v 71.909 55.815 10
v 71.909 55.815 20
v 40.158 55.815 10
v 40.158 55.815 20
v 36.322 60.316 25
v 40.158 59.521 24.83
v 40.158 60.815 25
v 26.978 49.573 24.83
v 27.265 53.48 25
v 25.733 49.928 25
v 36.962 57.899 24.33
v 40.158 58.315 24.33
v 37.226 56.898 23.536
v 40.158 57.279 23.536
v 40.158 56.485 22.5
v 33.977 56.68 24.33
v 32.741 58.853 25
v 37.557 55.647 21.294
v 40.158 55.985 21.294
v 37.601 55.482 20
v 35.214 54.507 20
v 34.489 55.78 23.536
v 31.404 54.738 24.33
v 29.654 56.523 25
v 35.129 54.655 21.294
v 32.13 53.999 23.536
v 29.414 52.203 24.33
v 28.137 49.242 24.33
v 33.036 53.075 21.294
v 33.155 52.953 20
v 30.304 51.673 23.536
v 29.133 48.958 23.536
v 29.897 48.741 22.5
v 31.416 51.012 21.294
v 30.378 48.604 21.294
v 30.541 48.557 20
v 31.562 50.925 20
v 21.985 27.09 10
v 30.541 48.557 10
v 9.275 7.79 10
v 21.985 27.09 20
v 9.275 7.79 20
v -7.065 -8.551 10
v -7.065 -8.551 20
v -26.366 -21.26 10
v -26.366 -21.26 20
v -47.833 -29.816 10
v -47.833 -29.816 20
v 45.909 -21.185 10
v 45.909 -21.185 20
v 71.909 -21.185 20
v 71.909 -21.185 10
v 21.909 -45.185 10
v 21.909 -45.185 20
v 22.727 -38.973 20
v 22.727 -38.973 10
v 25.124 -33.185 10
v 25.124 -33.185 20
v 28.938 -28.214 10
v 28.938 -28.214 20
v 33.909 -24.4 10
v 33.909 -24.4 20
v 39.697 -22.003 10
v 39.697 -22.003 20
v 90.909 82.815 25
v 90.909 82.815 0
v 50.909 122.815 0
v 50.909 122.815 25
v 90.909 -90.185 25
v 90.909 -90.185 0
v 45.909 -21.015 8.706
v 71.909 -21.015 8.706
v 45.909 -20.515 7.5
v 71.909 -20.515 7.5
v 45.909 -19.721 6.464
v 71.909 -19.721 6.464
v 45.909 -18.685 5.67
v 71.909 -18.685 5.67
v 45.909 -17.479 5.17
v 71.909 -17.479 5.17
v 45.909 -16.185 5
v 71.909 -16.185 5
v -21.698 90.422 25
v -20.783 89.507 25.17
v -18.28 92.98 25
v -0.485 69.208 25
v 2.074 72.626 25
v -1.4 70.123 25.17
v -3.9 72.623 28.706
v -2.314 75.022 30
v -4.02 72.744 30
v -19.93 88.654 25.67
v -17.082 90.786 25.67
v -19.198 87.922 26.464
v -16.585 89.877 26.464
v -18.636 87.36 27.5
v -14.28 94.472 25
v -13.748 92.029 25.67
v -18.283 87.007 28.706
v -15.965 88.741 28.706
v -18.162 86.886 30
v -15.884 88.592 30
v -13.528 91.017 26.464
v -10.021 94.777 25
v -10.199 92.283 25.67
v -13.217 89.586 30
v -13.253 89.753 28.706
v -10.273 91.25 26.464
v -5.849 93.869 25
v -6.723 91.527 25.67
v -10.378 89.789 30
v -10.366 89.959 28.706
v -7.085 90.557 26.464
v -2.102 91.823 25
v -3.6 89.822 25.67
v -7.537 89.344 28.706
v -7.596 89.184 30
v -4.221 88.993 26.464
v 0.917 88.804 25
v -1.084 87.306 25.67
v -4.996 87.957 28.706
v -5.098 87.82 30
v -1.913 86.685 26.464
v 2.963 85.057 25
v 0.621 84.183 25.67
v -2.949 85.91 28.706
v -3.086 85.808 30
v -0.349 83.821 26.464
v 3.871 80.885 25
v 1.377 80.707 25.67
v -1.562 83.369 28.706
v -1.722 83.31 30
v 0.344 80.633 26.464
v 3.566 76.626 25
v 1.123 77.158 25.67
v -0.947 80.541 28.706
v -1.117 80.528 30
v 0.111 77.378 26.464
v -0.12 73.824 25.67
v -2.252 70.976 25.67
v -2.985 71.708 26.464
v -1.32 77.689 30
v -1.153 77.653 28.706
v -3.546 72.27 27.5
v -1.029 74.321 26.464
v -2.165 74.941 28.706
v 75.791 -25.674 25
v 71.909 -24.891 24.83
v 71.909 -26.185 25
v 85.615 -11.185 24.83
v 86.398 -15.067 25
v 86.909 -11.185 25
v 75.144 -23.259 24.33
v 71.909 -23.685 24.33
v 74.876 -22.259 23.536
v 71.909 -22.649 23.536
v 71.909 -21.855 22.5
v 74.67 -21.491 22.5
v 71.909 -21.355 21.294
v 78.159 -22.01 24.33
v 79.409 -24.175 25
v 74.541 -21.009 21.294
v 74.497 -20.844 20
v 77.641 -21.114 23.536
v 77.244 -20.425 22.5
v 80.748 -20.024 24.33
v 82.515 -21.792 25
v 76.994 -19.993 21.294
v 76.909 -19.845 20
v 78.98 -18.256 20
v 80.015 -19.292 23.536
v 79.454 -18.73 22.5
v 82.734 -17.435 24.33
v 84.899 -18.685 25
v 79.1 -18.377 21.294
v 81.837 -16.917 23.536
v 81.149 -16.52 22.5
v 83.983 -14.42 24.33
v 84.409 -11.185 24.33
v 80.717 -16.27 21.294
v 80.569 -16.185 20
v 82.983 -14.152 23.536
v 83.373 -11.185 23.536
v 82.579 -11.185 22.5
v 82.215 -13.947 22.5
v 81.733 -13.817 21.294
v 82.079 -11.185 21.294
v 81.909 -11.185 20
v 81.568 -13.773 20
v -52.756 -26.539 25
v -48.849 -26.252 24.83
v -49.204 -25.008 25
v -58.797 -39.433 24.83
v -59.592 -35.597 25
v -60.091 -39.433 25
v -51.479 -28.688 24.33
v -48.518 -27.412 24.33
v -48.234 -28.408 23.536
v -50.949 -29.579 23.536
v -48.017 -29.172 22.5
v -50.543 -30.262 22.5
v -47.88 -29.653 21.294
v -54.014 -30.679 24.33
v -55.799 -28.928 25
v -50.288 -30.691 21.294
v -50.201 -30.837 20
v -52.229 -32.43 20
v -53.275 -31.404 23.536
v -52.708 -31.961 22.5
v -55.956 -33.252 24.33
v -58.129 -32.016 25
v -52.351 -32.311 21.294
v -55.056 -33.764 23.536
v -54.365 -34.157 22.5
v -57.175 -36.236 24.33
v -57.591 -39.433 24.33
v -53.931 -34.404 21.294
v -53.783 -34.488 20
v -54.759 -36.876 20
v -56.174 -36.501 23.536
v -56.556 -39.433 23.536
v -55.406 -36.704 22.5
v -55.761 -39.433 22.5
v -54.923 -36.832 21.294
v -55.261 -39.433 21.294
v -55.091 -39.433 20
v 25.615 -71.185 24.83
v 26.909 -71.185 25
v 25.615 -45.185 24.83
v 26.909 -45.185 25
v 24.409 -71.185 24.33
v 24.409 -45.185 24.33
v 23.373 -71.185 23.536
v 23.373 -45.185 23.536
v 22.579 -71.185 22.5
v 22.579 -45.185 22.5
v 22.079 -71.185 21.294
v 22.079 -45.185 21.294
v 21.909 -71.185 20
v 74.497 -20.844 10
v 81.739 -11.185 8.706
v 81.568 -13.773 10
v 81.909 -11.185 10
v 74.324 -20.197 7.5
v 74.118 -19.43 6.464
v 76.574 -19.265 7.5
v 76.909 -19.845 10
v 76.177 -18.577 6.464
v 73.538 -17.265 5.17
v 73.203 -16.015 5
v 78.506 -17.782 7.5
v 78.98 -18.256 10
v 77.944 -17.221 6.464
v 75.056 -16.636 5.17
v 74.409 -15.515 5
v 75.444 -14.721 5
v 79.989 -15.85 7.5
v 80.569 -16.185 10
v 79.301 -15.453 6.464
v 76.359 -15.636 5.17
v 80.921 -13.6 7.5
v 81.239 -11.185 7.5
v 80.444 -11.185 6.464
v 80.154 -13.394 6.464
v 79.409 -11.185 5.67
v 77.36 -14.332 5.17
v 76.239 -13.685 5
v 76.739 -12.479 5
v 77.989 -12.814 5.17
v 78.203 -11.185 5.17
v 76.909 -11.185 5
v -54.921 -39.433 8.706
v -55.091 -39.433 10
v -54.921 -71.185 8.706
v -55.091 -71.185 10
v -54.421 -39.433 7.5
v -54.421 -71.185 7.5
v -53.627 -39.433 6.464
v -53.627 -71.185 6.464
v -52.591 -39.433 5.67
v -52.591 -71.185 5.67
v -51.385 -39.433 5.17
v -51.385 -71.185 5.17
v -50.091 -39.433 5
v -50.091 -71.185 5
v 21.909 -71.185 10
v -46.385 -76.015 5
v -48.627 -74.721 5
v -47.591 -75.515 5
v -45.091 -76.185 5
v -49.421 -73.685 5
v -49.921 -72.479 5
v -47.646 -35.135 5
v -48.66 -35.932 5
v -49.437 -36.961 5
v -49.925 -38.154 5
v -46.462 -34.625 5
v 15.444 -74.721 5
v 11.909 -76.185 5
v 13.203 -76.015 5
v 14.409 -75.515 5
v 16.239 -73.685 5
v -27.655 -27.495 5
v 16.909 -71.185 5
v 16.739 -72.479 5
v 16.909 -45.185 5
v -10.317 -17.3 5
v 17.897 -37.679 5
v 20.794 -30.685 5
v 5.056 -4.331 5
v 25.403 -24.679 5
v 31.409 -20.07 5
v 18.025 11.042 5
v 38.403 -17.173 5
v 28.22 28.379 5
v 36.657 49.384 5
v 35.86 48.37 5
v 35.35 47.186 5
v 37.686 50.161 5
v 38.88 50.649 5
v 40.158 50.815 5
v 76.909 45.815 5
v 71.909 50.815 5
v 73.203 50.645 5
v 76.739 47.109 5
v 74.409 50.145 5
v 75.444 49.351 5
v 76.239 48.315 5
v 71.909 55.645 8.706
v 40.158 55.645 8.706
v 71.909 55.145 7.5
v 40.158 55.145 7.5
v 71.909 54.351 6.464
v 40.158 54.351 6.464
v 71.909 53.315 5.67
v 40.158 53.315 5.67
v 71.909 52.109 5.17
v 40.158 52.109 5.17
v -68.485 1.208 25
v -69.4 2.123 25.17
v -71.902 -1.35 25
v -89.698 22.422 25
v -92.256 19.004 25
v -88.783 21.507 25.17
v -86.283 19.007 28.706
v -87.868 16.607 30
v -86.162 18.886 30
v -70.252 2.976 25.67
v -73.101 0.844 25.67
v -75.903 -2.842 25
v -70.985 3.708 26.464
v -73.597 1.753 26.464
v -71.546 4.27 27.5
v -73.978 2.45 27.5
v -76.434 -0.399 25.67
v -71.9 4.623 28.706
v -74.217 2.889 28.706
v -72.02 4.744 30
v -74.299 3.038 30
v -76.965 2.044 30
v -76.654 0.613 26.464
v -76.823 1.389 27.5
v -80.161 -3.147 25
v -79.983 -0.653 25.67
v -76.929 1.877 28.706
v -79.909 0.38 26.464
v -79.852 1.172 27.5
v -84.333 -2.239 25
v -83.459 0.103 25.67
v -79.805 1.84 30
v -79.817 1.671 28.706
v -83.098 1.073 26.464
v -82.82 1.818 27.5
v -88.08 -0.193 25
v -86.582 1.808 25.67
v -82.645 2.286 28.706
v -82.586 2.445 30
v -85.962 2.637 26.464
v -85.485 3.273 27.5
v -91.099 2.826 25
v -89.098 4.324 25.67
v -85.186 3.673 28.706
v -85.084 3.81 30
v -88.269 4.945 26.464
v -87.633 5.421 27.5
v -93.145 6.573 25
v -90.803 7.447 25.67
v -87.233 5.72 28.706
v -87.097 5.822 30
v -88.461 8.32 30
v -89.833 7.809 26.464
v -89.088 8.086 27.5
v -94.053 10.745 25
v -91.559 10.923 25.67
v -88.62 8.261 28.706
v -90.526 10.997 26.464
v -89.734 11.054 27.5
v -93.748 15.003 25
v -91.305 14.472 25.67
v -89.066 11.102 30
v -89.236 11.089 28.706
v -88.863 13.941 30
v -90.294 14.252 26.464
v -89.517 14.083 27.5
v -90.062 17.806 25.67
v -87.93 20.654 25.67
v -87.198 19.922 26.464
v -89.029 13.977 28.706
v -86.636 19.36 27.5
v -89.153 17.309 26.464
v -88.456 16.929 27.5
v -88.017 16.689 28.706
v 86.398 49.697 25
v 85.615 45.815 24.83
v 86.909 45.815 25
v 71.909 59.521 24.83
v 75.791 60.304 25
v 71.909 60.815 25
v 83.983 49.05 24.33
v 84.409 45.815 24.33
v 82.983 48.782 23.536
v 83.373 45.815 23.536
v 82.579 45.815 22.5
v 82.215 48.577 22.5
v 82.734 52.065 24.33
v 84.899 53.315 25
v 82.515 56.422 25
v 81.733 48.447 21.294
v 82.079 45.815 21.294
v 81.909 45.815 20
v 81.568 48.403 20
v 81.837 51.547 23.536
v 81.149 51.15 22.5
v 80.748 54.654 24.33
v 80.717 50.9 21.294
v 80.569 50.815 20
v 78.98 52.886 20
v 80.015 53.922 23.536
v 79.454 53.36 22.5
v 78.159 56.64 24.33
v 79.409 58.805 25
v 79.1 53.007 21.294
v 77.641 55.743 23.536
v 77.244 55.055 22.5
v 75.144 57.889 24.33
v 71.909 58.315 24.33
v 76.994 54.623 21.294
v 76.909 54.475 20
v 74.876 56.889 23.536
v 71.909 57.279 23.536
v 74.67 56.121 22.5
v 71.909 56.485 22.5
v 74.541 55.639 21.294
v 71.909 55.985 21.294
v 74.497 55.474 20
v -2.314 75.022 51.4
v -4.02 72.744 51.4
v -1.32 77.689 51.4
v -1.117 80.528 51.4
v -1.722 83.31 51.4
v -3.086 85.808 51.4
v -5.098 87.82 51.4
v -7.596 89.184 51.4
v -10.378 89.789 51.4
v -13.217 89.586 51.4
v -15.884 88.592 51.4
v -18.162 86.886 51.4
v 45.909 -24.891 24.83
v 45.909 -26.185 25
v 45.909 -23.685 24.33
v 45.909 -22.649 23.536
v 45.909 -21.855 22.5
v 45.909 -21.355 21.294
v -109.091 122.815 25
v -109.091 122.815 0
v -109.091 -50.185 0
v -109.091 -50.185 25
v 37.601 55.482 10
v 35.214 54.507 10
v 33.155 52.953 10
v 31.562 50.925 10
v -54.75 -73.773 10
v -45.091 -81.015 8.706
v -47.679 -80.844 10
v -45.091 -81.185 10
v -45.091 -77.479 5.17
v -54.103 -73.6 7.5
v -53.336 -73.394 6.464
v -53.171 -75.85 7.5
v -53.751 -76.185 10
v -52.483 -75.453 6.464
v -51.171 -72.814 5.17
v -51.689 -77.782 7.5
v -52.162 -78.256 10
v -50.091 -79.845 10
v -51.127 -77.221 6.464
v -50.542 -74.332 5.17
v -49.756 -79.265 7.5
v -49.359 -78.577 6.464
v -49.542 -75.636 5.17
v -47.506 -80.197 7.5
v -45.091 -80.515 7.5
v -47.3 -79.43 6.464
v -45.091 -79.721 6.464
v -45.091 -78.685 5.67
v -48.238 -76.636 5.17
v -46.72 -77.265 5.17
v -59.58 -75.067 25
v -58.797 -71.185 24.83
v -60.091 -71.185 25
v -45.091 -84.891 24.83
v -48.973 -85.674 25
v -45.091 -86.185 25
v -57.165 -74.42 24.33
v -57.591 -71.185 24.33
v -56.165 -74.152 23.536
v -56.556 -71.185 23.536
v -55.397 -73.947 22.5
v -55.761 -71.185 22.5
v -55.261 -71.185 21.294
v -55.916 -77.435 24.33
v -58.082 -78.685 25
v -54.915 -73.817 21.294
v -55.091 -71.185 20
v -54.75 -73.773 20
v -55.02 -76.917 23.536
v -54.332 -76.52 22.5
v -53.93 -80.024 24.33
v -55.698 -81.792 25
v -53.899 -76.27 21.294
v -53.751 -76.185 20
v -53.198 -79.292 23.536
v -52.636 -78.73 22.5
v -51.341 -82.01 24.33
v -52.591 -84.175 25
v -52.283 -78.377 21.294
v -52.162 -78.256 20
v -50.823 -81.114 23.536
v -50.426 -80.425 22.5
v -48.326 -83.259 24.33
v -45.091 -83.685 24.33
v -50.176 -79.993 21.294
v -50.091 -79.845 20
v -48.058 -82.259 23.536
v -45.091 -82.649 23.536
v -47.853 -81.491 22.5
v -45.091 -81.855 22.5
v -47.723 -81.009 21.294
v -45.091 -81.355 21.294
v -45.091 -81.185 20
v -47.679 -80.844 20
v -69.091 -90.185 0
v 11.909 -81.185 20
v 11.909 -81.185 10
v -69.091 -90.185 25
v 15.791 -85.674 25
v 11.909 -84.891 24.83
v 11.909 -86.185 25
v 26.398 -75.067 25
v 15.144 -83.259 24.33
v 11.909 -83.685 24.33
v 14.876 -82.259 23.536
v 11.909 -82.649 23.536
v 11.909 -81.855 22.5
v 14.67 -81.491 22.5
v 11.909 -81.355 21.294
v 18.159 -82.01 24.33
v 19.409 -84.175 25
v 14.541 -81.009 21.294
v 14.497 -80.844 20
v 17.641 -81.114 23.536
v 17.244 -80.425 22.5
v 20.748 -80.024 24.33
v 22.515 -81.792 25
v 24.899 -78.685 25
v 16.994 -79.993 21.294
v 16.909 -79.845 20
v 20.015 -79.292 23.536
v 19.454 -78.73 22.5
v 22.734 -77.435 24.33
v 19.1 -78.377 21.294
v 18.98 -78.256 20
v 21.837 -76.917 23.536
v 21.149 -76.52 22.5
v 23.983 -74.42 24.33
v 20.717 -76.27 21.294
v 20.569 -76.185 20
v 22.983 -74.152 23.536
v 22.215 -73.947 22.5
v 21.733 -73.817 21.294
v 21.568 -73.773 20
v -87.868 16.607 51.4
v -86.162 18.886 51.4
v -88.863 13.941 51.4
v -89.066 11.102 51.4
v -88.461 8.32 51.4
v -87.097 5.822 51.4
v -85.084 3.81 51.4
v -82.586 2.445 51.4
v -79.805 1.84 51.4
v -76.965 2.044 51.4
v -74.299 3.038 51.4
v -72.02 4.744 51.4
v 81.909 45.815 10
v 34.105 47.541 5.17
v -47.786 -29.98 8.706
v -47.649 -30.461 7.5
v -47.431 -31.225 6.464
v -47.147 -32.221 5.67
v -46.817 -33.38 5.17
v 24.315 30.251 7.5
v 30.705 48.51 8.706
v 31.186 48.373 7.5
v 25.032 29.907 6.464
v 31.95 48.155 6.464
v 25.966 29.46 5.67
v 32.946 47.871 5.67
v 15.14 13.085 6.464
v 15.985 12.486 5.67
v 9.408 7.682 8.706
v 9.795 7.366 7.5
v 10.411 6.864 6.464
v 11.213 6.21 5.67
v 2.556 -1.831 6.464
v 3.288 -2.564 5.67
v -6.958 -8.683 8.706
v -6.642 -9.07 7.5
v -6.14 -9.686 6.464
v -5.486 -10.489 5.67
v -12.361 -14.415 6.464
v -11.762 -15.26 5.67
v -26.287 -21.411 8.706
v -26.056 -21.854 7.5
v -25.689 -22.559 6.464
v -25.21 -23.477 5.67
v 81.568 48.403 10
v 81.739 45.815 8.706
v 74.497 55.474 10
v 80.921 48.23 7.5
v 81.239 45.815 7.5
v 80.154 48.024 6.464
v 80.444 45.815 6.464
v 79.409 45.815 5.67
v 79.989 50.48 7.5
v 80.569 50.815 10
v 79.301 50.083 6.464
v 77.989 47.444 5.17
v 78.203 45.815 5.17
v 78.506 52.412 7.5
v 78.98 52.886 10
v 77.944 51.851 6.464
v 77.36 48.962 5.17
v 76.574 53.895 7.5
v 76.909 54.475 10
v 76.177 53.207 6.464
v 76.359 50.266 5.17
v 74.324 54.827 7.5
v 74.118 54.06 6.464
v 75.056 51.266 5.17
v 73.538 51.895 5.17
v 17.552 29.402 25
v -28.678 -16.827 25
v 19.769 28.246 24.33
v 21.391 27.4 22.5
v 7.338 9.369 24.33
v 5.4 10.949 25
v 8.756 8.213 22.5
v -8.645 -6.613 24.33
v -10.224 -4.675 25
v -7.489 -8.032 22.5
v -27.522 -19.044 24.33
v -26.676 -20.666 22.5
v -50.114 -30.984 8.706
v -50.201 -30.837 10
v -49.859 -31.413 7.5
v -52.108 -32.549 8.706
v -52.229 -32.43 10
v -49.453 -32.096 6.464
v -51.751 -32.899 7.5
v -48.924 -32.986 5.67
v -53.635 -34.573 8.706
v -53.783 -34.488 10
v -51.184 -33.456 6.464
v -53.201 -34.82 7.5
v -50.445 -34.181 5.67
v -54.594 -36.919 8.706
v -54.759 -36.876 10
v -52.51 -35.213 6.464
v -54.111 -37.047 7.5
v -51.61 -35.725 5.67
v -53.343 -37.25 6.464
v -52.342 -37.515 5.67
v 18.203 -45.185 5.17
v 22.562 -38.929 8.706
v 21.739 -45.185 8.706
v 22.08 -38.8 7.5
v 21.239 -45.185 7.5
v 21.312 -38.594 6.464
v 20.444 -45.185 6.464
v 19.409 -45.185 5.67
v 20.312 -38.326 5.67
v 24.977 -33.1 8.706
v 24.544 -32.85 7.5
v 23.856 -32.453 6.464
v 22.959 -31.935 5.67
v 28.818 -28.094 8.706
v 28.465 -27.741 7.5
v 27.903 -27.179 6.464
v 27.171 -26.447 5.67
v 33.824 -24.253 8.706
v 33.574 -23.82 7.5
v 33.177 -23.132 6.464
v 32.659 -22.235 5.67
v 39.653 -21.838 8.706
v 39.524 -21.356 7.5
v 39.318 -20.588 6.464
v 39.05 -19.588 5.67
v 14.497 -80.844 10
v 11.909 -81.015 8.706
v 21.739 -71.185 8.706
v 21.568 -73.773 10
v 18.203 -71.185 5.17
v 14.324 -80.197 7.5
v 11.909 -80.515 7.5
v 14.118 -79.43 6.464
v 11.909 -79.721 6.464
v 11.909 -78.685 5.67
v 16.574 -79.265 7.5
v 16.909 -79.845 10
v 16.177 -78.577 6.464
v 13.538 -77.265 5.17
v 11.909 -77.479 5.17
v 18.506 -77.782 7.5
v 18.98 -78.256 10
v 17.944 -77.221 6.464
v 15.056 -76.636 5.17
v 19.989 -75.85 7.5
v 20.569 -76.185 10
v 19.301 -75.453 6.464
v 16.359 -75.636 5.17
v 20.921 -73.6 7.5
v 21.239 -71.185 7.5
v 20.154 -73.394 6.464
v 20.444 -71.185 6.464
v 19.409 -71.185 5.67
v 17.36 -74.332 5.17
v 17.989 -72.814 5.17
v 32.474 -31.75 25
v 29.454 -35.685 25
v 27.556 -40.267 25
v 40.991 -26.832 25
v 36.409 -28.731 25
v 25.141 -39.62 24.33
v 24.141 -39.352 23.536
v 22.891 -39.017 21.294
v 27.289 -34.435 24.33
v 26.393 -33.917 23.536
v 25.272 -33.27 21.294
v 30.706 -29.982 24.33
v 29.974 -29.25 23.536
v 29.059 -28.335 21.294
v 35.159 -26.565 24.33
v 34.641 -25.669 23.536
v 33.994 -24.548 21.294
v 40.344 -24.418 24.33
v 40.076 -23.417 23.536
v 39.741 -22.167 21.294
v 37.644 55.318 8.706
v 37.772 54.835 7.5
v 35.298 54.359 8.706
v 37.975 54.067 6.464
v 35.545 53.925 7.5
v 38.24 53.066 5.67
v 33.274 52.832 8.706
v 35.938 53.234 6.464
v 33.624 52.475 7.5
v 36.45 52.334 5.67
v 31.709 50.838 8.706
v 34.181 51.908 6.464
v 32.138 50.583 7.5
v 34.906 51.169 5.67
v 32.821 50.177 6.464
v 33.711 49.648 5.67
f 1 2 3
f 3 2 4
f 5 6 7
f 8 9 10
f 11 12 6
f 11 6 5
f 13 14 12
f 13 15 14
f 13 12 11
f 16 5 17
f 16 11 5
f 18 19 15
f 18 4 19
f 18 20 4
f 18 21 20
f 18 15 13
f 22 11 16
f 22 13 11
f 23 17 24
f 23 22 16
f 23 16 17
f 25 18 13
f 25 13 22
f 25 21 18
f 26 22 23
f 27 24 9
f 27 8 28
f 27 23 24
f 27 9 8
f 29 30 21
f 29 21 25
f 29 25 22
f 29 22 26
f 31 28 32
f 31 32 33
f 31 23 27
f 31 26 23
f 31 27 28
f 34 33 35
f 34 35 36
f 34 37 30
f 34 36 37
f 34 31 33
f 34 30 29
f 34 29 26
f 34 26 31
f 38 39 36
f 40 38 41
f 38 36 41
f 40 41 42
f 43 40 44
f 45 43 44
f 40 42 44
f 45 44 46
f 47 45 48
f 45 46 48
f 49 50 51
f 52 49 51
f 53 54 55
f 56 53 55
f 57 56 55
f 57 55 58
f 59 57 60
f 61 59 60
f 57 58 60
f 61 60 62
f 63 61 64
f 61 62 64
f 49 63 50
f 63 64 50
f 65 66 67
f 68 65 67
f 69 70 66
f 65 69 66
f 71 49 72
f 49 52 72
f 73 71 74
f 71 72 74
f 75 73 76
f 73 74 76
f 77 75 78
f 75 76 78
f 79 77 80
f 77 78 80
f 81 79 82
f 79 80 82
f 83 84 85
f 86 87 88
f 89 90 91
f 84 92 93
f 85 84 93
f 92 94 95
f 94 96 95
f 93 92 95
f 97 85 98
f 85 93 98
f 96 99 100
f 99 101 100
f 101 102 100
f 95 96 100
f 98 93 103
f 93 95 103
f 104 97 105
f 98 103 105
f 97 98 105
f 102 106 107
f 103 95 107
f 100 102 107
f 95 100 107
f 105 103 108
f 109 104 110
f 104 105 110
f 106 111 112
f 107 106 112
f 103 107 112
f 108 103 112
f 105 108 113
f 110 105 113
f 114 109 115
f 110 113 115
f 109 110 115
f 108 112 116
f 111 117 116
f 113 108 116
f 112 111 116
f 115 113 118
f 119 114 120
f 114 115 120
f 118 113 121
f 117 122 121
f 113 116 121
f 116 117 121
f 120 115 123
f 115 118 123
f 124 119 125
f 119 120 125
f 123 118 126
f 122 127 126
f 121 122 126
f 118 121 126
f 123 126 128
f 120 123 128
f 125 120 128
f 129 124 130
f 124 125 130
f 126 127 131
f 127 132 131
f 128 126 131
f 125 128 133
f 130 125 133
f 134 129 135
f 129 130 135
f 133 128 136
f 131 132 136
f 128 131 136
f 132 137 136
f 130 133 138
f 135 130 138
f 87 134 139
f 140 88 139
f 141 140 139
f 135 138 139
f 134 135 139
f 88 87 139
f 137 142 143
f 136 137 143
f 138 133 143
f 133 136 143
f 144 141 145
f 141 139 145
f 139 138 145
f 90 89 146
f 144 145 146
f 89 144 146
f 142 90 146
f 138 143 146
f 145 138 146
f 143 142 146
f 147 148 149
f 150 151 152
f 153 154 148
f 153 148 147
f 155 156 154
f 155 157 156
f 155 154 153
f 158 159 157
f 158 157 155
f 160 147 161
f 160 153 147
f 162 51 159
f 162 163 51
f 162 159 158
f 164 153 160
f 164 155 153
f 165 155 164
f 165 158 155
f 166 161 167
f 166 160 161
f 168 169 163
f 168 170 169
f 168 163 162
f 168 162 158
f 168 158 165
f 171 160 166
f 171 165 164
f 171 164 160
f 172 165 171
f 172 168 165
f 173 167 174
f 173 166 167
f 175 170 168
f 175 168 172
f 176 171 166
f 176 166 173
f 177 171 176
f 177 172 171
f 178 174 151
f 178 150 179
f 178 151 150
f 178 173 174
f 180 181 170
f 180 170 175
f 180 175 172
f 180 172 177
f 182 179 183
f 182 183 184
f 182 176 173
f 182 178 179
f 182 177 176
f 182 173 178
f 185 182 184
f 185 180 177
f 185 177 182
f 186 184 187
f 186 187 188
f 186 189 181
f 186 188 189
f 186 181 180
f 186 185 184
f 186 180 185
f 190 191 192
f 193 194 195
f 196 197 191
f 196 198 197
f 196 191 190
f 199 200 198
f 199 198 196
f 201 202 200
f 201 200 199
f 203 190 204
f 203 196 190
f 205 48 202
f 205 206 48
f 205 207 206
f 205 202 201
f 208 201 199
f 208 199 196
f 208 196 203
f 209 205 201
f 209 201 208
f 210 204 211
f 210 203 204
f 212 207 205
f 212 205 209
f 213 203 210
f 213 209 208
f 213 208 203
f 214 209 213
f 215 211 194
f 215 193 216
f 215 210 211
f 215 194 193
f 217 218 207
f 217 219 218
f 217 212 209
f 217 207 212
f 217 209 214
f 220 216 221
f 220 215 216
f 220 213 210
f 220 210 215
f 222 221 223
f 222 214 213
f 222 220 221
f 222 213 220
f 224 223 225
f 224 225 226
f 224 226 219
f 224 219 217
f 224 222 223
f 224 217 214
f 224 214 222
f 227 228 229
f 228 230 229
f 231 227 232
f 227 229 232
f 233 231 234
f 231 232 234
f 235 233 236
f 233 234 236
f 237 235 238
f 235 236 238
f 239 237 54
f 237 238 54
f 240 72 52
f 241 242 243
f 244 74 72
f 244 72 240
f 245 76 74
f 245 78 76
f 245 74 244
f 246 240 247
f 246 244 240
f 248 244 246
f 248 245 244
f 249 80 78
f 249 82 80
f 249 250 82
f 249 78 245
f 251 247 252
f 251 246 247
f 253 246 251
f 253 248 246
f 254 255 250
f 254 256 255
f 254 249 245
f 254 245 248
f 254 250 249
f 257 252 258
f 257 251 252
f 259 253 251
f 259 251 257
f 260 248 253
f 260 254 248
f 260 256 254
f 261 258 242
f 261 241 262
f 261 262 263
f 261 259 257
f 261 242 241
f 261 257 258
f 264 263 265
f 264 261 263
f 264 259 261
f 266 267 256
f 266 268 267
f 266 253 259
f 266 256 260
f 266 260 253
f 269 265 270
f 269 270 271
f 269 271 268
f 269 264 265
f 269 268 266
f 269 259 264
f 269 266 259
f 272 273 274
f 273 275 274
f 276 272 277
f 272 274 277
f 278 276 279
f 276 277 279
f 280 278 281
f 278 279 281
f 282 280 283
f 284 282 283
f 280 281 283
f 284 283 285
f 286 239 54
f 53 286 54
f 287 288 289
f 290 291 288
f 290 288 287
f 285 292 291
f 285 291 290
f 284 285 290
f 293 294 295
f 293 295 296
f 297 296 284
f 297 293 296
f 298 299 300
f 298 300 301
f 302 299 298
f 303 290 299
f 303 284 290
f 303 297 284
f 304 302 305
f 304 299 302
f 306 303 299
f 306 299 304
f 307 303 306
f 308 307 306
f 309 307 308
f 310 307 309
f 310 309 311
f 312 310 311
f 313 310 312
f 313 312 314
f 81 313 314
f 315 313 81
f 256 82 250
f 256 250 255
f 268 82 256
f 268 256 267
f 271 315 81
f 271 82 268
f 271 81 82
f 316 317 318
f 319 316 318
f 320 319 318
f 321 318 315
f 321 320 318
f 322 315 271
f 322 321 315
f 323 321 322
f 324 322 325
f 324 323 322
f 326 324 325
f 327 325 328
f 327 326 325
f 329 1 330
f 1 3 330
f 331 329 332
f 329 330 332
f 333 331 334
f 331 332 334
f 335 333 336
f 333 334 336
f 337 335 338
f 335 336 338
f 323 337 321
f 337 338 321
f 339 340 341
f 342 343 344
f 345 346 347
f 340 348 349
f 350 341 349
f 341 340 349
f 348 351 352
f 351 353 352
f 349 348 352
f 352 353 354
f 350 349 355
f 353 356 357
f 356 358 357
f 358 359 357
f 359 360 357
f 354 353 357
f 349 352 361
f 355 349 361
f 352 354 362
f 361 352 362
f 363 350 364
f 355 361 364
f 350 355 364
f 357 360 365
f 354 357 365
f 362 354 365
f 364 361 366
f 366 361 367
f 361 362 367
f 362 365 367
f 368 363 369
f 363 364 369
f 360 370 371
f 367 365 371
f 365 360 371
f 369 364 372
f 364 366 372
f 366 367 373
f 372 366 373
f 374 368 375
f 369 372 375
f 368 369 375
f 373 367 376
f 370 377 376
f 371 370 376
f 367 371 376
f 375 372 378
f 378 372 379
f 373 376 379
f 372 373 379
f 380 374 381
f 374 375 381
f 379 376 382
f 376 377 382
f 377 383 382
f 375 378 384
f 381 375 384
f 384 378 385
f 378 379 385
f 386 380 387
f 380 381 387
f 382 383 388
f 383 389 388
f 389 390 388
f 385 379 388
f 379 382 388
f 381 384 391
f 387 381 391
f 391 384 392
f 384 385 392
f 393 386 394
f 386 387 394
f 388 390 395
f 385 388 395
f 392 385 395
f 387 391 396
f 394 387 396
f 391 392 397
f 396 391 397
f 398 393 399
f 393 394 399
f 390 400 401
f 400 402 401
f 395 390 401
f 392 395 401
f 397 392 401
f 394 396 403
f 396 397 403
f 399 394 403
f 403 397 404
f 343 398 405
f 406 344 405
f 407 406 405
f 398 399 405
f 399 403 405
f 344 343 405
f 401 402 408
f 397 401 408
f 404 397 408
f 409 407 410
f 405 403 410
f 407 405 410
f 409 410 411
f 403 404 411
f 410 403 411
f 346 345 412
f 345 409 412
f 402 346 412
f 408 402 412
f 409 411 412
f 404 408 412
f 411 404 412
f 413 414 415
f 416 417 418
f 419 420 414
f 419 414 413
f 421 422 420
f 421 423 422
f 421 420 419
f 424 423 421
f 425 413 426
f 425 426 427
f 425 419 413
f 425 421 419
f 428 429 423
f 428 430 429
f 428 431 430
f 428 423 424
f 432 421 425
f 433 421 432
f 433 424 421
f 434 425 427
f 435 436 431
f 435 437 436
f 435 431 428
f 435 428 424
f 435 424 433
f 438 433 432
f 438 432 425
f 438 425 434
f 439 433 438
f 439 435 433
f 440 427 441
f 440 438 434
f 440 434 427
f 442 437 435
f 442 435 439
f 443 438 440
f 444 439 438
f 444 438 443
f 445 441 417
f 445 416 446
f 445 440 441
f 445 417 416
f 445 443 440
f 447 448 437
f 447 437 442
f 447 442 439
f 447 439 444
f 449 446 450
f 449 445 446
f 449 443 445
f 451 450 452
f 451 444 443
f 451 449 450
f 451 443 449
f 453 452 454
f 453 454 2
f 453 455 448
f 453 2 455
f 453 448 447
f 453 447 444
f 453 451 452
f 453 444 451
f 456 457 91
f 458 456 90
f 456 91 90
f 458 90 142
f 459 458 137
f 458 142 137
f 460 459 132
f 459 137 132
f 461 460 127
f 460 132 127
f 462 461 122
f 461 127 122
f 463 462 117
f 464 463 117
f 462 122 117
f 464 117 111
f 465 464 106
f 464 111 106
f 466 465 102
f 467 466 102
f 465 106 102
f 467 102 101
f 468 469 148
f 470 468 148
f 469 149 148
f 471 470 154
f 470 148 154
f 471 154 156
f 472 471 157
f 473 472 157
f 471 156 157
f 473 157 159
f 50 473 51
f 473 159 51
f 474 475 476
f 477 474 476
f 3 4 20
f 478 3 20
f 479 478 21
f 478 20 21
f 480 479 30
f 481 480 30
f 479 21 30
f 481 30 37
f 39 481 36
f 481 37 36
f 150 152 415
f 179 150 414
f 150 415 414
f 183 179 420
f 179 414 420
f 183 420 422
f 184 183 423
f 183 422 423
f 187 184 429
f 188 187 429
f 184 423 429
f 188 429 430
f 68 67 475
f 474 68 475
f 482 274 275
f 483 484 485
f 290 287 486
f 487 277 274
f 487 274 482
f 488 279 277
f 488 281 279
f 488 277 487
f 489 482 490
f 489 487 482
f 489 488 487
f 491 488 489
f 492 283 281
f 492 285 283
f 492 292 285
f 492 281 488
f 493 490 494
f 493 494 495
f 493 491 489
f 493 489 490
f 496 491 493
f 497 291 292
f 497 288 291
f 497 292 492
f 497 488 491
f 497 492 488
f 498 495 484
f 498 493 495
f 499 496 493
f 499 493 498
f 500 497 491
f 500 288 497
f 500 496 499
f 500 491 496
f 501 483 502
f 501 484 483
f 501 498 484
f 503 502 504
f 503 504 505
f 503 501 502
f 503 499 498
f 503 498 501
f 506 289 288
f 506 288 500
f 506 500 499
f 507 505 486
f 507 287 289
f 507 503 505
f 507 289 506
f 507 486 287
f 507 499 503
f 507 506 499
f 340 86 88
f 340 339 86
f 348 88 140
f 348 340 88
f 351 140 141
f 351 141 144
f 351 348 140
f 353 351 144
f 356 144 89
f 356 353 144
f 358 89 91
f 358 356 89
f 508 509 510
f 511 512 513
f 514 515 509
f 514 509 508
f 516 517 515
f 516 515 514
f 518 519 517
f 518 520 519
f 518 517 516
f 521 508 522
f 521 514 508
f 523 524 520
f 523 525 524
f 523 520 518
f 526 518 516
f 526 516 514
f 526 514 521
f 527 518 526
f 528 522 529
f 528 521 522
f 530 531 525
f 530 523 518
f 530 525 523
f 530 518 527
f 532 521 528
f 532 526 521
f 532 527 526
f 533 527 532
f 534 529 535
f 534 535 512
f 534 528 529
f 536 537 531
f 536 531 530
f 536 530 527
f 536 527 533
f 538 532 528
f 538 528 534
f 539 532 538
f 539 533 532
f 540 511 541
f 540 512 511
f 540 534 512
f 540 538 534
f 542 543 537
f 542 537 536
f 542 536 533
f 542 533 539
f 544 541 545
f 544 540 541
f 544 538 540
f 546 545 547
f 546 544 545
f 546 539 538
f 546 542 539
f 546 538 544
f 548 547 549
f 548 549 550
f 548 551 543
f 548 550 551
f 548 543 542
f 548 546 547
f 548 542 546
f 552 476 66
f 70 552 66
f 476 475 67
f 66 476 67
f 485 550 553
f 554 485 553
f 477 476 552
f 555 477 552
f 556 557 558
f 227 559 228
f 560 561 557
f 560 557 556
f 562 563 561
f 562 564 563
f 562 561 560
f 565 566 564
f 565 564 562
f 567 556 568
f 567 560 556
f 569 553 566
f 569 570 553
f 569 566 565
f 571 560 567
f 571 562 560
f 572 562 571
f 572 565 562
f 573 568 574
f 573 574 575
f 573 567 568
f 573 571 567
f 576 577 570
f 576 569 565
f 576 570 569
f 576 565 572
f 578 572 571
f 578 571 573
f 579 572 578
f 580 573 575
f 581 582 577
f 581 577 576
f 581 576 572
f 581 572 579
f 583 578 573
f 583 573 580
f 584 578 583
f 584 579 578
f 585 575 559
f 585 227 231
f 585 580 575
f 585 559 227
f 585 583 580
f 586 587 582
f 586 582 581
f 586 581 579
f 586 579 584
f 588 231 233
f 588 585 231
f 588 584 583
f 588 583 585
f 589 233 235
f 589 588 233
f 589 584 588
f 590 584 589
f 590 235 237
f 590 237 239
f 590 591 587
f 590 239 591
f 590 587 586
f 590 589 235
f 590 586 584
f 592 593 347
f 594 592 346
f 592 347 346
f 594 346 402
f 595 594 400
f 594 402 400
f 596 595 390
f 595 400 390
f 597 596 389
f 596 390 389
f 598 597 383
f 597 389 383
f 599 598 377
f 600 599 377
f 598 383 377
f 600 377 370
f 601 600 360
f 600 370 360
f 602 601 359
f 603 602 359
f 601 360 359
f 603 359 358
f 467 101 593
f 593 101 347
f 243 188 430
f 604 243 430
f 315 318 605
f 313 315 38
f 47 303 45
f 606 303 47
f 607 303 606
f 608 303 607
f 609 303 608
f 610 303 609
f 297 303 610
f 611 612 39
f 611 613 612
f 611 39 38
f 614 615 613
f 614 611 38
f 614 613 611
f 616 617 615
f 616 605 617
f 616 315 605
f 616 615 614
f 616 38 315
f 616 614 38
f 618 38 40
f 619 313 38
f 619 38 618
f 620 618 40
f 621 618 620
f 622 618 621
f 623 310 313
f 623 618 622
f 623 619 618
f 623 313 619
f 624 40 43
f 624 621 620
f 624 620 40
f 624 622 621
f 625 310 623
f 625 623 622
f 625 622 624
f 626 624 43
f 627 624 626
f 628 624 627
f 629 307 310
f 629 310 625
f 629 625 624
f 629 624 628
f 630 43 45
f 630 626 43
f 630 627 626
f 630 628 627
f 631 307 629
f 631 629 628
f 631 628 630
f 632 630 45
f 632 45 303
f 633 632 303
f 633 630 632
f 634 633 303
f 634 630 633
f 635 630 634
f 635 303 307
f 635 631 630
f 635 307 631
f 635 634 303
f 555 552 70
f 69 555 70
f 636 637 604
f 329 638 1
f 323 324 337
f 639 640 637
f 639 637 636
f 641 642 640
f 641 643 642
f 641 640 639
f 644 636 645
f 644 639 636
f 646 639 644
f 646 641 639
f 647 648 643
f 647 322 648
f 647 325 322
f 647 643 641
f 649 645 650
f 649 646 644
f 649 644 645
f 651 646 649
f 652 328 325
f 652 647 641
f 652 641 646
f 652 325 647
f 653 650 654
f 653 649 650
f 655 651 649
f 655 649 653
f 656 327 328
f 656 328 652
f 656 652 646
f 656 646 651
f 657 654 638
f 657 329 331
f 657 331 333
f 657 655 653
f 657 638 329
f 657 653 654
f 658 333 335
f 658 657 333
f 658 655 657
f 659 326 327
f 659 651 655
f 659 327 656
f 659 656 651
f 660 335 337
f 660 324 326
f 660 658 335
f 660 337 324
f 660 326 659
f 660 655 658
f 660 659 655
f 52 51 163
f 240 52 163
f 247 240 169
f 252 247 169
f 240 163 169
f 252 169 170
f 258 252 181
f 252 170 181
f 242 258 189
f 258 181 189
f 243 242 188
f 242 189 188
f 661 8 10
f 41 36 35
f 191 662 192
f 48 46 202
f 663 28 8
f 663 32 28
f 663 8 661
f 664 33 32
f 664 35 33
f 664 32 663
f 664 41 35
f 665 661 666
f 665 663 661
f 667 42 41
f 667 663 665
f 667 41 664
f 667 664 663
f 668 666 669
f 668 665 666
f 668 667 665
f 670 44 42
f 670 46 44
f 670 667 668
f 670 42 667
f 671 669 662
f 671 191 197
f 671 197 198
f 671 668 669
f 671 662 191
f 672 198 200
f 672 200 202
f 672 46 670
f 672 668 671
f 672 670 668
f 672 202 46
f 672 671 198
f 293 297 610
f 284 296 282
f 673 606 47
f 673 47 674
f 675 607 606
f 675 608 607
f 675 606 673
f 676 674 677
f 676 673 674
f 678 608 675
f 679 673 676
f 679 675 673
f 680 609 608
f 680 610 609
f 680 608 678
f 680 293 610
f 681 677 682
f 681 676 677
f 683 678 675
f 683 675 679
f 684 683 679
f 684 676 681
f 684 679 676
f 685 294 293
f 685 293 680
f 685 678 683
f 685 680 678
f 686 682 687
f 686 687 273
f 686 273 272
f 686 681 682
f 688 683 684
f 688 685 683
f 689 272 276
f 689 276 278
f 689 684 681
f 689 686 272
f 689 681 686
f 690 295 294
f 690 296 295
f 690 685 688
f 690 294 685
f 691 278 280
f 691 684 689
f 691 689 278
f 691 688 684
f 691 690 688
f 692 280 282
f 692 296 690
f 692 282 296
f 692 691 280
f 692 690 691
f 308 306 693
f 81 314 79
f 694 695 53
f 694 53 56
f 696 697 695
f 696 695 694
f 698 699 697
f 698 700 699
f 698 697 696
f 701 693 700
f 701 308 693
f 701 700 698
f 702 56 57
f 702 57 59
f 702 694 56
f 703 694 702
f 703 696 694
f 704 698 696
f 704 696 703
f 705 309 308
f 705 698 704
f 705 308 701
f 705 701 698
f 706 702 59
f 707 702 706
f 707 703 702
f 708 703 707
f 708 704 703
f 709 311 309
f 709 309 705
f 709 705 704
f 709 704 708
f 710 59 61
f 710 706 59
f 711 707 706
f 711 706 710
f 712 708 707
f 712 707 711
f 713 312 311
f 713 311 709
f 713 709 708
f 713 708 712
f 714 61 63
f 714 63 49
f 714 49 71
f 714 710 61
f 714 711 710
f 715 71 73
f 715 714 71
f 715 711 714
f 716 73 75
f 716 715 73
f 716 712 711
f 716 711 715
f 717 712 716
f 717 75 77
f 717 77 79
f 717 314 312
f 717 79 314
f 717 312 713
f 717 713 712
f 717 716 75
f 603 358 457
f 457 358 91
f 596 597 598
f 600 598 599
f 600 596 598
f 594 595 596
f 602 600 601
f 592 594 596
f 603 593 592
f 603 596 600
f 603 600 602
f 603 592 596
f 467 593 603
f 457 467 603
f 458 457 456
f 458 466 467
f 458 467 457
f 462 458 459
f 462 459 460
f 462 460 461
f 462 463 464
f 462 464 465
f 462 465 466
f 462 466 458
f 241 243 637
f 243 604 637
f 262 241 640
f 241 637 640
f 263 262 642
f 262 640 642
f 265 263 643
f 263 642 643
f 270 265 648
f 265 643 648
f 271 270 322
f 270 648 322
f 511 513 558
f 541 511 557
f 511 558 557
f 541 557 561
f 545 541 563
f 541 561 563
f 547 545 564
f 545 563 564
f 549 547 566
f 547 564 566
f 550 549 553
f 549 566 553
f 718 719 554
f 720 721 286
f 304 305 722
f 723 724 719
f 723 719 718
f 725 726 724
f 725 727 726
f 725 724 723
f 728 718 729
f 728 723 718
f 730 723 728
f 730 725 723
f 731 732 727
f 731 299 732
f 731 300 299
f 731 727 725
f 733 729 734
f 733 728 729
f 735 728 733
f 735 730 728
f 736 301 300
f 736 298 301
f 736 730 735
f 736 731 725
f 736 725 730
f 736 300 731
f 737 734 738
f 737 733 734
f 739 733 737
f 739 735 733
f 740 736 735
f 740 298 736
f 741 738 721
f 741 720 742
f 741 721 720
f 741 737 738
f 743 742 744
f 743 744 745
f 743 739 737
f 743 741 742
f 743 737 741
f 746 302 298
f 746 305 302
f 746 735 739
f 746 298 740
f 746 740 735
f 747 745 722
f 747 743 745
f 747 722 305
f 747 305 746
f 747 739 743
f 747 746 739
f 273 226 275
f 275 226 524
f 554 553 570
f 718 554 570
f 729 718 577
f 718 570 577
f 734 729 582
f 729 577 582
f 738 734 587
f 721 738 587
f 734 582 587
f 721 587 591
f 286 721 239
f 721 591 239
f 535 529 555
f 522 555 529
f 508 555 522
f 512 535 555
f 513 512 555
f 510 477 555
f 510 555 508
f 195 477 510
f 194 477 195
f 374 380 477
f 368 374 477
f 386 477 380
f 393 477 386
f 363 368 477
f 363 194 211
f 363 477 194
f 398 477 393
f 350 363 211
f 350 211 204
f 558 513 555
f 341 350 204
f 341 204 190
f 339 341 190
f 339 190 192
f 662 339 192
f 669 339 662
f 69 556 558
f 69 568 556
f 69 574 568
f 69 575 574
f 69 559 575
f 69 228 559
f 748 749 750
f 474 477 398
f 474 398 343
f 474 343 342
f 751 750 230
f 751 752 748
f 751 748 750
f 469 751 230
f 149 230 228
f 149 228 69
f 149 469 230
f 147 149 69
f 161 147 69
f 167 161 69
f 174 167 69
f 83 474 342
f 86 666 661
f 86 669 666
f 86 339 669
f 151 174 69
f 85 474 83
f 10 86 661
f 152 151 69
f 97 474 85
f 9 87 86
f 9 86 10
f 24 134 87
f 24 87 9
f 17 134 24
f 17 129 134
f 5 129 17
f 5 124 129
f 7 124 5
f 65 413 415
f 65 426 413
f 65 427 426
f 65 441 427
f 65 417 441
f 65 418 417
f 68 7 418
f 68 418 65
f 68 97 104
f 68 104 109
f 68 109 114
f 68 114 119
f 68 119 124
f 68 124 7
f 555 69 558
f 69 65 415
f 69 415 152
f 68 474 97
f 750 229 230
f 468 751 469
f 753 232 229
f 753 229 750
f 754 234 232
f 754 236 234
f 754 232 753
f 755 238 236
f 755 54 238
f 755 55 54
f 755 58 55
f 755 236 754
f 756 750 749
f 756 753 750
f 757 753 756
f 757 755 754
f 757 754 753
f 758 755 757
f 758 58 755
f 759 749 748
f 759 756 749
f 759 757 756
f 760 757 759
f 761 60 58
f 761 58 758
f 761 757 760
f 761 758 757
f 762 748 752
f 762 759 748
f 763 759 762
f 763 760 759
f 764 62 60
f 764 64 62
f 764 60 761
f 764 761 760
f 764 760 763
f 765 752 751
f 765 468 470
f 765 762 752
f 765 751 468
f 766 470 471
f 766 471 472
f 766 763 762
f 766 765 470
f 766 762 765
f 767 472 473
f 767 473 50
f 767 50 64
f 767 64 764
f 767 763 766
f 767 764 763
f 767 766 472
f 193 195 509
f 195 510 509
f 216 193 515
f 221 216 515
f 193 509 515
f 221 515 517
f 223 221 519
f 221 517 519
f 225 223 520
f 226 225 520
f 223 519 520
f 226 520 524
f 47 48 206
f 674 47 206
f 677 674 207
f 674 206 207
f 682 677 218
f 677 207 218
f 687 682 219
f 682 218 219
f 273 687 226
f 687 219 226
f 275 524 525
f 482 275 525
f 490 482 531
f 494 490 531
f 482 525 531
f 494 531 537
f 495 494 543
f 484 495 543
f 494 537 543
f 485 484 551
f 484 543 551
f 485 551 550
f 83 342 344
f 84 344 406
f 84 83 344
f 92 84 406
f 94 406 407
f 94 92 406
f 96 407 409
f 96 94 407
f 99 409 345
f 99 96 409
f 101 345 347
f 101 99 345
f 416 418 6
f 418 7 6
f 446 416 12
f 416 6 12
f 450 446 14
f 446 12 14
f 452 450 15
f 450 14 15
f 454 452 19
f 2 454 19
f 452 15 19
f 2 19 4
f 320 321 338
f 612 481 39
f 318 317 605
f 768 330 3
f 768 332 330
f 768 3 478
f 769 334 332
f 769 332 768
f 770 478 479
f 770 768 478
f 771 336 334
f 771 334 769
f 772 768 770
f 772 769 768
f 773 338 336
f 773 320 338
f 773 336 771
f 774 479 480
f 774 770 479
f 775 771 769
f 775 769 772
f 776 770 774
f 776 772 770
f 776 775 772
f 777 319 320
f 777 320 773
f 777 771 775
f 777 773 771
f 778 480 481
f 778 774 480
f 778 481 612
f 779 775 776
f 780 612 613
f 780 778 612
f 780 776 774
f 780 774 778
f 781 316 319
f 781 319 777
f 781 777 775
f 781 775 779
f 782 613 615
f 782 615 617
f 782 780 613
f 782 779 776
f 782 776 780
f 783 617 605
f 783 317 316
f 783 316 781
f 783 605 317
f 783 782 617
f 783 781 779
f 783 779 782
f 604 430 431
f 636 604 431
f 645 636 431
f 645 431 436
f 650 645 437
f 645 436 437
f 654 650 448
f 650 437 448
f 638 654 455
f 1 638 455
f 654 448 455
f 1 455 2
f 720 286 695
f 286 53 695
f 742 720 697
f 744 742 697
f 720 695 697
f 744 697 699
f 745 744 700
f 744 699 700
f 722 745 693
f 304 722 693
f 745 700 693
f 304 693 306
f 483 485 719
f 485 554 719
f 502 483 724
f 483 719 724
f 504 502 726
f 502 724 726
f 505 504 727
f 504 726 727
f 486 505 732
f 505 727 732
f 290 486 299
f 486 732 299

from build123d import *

# Parameters (mm, degrees)
F1_DEPTH = 25
F2_DEPTH = 51.4
F3_R     = 5
F4_DEPTH = 26
F5_DEPTH = 21
F6_R     = 5


with BuildPart() as f1:
    # F0 (on Top) → F1 (new body)
    with BuildSketch(Plane.XY):
        Polygon((-109.0911263708, -50.1850256925), (-69.0911263708, -90.1850256925), (90.9088736292, -90.1850256925), (90.9088736292, 79.8149743075), (90.9088736292, 82.8149743075), (50.9088736292, 122.8149743075), (-109.0911263708, 122.8149743075), align=None)
        with BuildLine():
            ThreePointArc((-55.0911263708, -39.4331600105), (-53.0729169233, -33.4089571938), (-47.8329224556, -29.8163749848))
            ThreePointArc((-47.8329224556, -29.8163749848), (1.5201909917, -0.7957829849), (30.5414983829, 48.5569097914))
            ThreePointArc((30.5414983829, 48.5569097914), (34.1340986973, 53.7968085215), (40.158243664, 55.8149743075))
            Line((40.158243664, 55.8149743075), (71.9088736292, 55.8149743075))
            ThreePointArc((71.9088736292, 55.8149743075), (78.979941441, 52.8860421194), (81.9088736292, 45.8149743075))
            Line((81.9088736292, 45.8149743075), (81.9088736292, -11.1850256925))
            ThreePointArc((81.9088736292, -11.1850256925), (78.979941441, -18.2560935043), (71.9088736292, -21.1850256925))
            Line((71.9088736292, -21.1850256925), (45.9088736292, -21.1850256925))
            ThreePointArc((45.9088736292, -21.1850256925), (28.9383108807, -28.214462944), (21.9088736292, -45.1850256925))
            Line((21.9088736292, -45.1850256925), (21.9088736292, -71.1850256925))
            ThreePointArc((21.9088736292, -71.1850256925), (18.979941441, -78.2560935043), (11.9088736292, -81.1850256925))
            Line((11.9088736292, -81.1850256925), (-45.0911263708, -81.1850256925))
            ThreePointArc((-45.0911263708, -81.1850256925), (-52.1621941827, -78.2560935043), (-55.0911263708, -71.1850256925))
            Line((-55.0911263708, -71.1850256925), (-55.0911263708, -39.4331600105))
        make_face(mode=Mode.SUBTRACT)
        with BuildLine():
            ThreePointArc((-25.2332619945, 93.9571099313), (3.3880299167, 93.6118592169), (2.3524786931, 65.0072235369))
            Line((2.3524786931, 65.0072235369), (-64.9455336496, -2.3237033734))
            ThreePointArc((-64.9455336496, -2.3237033734), (-93.2298044744, -2.3271608935), (-93.2332619945, 25.9571099313))
            Line((-93.2332619945, 25.9571099313), (-25.2332619945, 93.9571099313))
        make_face(mode=Mode.SUBTRACT)
        with BuildLine():
            ThreePointArc((30.5414983829, 48.5569097914), (1.5201909917, -0.7957829849), (-47.8329224556, -29.8163749848))
            ThreePointArc((-47.8329224556, -29.8163749848), (-53.0729169233, -33.4089571938), (-55.0911263708, -39.4331600105))
            Line((-55.0911263708, -39.4331600105), (-55.0911263708, -71.1850256925))
            ThreePointArc((-55.0911263708, -71.1850256925), (-52.1621941827, -78.2560935043), (-45.0911263708, -81.1850256925))
            Line((-45.0911263708, -81.1850256925), (11.9088736292, -81.1850256925))
            ThreePointArc((11.9088736292, -81.1850256925), (18.979941441, -78.2560935043), (21.9088736292, -71.1850256925))
            Line((21.9088736292, -71.1850256925), (21.9088736292, -45.1850256925))
            ThreePointArc((21.9088736292, -45.1850256925), (28.9383108807, -28.214462944), (45.9088736292, -21.1850256925))
            Line((45.9088736292, -21.1850256925), (71.9088736292, -21.1850256925))
            ThreePointArc((71.9088736292, -21.1850256925), (78.979941441, -18.2560935043), (81.9088736292, -11.1850256925))
            Line((81.9088736292, -11.1850256925), (81.9088736292, 45.8149743075))
            ThreePointArc((81.9088736292, 45.8149743075), (78.979941441, 52.8860421194), (71.9088736292, 55.8149743075))
            Line((71.9088736292, 55.8149743075), (40.158243664, 55.8149743075))
            ThreePointArc((40.158243664, 55.8149743075), (34.1340986973, 53.7968085215), (30.5414983829, 48.5569097914))
        make_face()
        with BuildLine():
            Line((-64.9455336496, -2.3237033734), (2.3524786931, 65.0072235369))
            ThreePointArc((2.3524786931, 65.0072235369), (3.3880299167, 93.6118592169), (-25.2332619945, 93.9571099313))
            Line((-25.2332619945, 93.9571099313), (-93.2332619945, 25.9571099313))
            ThreePointArc((-93.2332619945, 25.9571099313), (-93.2298044744, -2.3271608935), (-64.9455336496, -2.3237033734))
        make_face()
        with BuildLine():
            ThreePointArc((-72.020058559, 4.7439064957), (-86.1621941827, 4.7439064957), (-86.1621941827, 18.8860421194))
            Line((-86.1621941827, 18.8860421194), (-18.1621941827, 86.8860421194))
            ThreePointArc((-18.1621941827, 86.8860421194), (-4.020058559, 86.8860421194), (-4.020058559, 72.7439064957))
            Line((-4.020058559, 72.7439064957), (-72.020058559, 4.7439064957))
        make_face(mode=Mode.SUBTRACT)
        with BuildLine():
            Line((-18.1621941827, 86.8860421194), (-86.1621941827, 18.8860421194))
            ThreePointArc((-86.1621941827, 18.8860421194), (-86.1621941827, 4.7439064957), (-72.020058559, 4.7439064957))
            Line((-72.020058559, 4.7439064957), (-4.020058559, 72.7439064957))
            ThreePointArc((-4.020058559, 72.7439064957), (-4.020058559, 86.8860421194), (-18.1621941827, 86.8860421194))
        make_face()
    extrude(amount=F1_DEPTH)

    # F0 (on Top) → F2 (join)
    with BuildSketch(Plane.XY):
        with BuildLine():
            Line((-18.1621941827, 86.8860421194), (-86.1621941827, 18.8860421194))
            ThreePointArc((-86.1621941827, 18.8860421194), (-86.1621941827, 4.7439064957), (-72.020058559, 4.7439064957))
            Line((-72.020058559, 4.7439064957), (-4.020058559, 72.7439064957))
            ThreePointArc((-4.020058559, 72.7439064957), (-4.020058559, 86.8860421194), (-18.1621941827, 86.8860421194))
        make_face()
    extrude(amount=F2_DEPTH)

    # F3
    f3_edges = [f1.edges().sort_by_distance(p)[0] for p in [
        (-38.020059, 38.743906, 25),
    ]]
    fillet(f3_edges, radius=F3_R)

    # F0 (on Top) → F4 (join)
    with BuildSketch(Plane.XY):
        with BuildLine():
            ThreePointArc((30.5414983829, 48.5569097914), (1.5201909917, -0.7957829849), (-47.8329224556, -29.8163749848))
            ThreePointArc((-47.8329224556, -29.8163749848), (-53.0729169233, -33.4089571938), (-55.0911263708, -39.4331600105))
            Line((-55.0911263708, -39.4331600105), (-55.0911263708, -71.1850256925))
            ThreePointArc((-55.0911263708, -71.1850256925), (-52.1621941827, -78.2560935043), (-45.0911263708, -81.1850256925))
            Line((-45.0911263708, -81.1850256925), (11.9088736292, -81.1850256925))
            ThreePointArc((11.9088736292, -81.1850256925), (18.979941441, -78.2560935043), (21.9088736292, -71.1850256925))
            Line((21.9088736292, -71.1850256925), (21.9088736292, -45.1850256925))
            ThreePointArc((21.9088736292, -45.1850256925), (28.9383108807, -28.214462944), (45.9088736292, -21.1850256925))
            Line((45.9088736292, -21.1850256925), (71.9088736292, -21.1850256925))
            ThreePointArc((71.9088736292, -21.1850256925), (78.979941441, -18.2560935043), (81.9088736292, -11.1850256925))
            Line((81.9088736292, -11.1850256925), (81.9088736292, 45.8149743075))
            ThreePointArc((81.9088736292, 45.8149743075), (78.979941441, 52.8860421194), (71.9088736292, 55.8149743075))
            Line((71.9088736292, 55.8149743075), (40.158243664, 55.8149743075))
            ThreePointArc((40.158243664, 55.8149743075), (34.1340986973, 53.7968085215), (30.5414983829, 48.5569097914))
        make_face()
    extrude(amount=F4_DEPTH)

    # F5 (cut): a face of the model
    f5_faces = [f1.faces().sort_by_distance(p)[0] for p in [
        (17.7294443372, -17.0058627659, 26),
    ]]
    extrude(f5_faces, amount=-F5_DEPTH, mode=Mode.SUBTRACT)

    # F6
    f6_edges = [f1.edges().sort_by_distance(p)[0] for p in [
        (1.520191, -0.795783, 25),
        (1.520191, -0.795783, 5),
    ]]
    fillet(f6_edges, radius=F6_R)


solid = f1.part
